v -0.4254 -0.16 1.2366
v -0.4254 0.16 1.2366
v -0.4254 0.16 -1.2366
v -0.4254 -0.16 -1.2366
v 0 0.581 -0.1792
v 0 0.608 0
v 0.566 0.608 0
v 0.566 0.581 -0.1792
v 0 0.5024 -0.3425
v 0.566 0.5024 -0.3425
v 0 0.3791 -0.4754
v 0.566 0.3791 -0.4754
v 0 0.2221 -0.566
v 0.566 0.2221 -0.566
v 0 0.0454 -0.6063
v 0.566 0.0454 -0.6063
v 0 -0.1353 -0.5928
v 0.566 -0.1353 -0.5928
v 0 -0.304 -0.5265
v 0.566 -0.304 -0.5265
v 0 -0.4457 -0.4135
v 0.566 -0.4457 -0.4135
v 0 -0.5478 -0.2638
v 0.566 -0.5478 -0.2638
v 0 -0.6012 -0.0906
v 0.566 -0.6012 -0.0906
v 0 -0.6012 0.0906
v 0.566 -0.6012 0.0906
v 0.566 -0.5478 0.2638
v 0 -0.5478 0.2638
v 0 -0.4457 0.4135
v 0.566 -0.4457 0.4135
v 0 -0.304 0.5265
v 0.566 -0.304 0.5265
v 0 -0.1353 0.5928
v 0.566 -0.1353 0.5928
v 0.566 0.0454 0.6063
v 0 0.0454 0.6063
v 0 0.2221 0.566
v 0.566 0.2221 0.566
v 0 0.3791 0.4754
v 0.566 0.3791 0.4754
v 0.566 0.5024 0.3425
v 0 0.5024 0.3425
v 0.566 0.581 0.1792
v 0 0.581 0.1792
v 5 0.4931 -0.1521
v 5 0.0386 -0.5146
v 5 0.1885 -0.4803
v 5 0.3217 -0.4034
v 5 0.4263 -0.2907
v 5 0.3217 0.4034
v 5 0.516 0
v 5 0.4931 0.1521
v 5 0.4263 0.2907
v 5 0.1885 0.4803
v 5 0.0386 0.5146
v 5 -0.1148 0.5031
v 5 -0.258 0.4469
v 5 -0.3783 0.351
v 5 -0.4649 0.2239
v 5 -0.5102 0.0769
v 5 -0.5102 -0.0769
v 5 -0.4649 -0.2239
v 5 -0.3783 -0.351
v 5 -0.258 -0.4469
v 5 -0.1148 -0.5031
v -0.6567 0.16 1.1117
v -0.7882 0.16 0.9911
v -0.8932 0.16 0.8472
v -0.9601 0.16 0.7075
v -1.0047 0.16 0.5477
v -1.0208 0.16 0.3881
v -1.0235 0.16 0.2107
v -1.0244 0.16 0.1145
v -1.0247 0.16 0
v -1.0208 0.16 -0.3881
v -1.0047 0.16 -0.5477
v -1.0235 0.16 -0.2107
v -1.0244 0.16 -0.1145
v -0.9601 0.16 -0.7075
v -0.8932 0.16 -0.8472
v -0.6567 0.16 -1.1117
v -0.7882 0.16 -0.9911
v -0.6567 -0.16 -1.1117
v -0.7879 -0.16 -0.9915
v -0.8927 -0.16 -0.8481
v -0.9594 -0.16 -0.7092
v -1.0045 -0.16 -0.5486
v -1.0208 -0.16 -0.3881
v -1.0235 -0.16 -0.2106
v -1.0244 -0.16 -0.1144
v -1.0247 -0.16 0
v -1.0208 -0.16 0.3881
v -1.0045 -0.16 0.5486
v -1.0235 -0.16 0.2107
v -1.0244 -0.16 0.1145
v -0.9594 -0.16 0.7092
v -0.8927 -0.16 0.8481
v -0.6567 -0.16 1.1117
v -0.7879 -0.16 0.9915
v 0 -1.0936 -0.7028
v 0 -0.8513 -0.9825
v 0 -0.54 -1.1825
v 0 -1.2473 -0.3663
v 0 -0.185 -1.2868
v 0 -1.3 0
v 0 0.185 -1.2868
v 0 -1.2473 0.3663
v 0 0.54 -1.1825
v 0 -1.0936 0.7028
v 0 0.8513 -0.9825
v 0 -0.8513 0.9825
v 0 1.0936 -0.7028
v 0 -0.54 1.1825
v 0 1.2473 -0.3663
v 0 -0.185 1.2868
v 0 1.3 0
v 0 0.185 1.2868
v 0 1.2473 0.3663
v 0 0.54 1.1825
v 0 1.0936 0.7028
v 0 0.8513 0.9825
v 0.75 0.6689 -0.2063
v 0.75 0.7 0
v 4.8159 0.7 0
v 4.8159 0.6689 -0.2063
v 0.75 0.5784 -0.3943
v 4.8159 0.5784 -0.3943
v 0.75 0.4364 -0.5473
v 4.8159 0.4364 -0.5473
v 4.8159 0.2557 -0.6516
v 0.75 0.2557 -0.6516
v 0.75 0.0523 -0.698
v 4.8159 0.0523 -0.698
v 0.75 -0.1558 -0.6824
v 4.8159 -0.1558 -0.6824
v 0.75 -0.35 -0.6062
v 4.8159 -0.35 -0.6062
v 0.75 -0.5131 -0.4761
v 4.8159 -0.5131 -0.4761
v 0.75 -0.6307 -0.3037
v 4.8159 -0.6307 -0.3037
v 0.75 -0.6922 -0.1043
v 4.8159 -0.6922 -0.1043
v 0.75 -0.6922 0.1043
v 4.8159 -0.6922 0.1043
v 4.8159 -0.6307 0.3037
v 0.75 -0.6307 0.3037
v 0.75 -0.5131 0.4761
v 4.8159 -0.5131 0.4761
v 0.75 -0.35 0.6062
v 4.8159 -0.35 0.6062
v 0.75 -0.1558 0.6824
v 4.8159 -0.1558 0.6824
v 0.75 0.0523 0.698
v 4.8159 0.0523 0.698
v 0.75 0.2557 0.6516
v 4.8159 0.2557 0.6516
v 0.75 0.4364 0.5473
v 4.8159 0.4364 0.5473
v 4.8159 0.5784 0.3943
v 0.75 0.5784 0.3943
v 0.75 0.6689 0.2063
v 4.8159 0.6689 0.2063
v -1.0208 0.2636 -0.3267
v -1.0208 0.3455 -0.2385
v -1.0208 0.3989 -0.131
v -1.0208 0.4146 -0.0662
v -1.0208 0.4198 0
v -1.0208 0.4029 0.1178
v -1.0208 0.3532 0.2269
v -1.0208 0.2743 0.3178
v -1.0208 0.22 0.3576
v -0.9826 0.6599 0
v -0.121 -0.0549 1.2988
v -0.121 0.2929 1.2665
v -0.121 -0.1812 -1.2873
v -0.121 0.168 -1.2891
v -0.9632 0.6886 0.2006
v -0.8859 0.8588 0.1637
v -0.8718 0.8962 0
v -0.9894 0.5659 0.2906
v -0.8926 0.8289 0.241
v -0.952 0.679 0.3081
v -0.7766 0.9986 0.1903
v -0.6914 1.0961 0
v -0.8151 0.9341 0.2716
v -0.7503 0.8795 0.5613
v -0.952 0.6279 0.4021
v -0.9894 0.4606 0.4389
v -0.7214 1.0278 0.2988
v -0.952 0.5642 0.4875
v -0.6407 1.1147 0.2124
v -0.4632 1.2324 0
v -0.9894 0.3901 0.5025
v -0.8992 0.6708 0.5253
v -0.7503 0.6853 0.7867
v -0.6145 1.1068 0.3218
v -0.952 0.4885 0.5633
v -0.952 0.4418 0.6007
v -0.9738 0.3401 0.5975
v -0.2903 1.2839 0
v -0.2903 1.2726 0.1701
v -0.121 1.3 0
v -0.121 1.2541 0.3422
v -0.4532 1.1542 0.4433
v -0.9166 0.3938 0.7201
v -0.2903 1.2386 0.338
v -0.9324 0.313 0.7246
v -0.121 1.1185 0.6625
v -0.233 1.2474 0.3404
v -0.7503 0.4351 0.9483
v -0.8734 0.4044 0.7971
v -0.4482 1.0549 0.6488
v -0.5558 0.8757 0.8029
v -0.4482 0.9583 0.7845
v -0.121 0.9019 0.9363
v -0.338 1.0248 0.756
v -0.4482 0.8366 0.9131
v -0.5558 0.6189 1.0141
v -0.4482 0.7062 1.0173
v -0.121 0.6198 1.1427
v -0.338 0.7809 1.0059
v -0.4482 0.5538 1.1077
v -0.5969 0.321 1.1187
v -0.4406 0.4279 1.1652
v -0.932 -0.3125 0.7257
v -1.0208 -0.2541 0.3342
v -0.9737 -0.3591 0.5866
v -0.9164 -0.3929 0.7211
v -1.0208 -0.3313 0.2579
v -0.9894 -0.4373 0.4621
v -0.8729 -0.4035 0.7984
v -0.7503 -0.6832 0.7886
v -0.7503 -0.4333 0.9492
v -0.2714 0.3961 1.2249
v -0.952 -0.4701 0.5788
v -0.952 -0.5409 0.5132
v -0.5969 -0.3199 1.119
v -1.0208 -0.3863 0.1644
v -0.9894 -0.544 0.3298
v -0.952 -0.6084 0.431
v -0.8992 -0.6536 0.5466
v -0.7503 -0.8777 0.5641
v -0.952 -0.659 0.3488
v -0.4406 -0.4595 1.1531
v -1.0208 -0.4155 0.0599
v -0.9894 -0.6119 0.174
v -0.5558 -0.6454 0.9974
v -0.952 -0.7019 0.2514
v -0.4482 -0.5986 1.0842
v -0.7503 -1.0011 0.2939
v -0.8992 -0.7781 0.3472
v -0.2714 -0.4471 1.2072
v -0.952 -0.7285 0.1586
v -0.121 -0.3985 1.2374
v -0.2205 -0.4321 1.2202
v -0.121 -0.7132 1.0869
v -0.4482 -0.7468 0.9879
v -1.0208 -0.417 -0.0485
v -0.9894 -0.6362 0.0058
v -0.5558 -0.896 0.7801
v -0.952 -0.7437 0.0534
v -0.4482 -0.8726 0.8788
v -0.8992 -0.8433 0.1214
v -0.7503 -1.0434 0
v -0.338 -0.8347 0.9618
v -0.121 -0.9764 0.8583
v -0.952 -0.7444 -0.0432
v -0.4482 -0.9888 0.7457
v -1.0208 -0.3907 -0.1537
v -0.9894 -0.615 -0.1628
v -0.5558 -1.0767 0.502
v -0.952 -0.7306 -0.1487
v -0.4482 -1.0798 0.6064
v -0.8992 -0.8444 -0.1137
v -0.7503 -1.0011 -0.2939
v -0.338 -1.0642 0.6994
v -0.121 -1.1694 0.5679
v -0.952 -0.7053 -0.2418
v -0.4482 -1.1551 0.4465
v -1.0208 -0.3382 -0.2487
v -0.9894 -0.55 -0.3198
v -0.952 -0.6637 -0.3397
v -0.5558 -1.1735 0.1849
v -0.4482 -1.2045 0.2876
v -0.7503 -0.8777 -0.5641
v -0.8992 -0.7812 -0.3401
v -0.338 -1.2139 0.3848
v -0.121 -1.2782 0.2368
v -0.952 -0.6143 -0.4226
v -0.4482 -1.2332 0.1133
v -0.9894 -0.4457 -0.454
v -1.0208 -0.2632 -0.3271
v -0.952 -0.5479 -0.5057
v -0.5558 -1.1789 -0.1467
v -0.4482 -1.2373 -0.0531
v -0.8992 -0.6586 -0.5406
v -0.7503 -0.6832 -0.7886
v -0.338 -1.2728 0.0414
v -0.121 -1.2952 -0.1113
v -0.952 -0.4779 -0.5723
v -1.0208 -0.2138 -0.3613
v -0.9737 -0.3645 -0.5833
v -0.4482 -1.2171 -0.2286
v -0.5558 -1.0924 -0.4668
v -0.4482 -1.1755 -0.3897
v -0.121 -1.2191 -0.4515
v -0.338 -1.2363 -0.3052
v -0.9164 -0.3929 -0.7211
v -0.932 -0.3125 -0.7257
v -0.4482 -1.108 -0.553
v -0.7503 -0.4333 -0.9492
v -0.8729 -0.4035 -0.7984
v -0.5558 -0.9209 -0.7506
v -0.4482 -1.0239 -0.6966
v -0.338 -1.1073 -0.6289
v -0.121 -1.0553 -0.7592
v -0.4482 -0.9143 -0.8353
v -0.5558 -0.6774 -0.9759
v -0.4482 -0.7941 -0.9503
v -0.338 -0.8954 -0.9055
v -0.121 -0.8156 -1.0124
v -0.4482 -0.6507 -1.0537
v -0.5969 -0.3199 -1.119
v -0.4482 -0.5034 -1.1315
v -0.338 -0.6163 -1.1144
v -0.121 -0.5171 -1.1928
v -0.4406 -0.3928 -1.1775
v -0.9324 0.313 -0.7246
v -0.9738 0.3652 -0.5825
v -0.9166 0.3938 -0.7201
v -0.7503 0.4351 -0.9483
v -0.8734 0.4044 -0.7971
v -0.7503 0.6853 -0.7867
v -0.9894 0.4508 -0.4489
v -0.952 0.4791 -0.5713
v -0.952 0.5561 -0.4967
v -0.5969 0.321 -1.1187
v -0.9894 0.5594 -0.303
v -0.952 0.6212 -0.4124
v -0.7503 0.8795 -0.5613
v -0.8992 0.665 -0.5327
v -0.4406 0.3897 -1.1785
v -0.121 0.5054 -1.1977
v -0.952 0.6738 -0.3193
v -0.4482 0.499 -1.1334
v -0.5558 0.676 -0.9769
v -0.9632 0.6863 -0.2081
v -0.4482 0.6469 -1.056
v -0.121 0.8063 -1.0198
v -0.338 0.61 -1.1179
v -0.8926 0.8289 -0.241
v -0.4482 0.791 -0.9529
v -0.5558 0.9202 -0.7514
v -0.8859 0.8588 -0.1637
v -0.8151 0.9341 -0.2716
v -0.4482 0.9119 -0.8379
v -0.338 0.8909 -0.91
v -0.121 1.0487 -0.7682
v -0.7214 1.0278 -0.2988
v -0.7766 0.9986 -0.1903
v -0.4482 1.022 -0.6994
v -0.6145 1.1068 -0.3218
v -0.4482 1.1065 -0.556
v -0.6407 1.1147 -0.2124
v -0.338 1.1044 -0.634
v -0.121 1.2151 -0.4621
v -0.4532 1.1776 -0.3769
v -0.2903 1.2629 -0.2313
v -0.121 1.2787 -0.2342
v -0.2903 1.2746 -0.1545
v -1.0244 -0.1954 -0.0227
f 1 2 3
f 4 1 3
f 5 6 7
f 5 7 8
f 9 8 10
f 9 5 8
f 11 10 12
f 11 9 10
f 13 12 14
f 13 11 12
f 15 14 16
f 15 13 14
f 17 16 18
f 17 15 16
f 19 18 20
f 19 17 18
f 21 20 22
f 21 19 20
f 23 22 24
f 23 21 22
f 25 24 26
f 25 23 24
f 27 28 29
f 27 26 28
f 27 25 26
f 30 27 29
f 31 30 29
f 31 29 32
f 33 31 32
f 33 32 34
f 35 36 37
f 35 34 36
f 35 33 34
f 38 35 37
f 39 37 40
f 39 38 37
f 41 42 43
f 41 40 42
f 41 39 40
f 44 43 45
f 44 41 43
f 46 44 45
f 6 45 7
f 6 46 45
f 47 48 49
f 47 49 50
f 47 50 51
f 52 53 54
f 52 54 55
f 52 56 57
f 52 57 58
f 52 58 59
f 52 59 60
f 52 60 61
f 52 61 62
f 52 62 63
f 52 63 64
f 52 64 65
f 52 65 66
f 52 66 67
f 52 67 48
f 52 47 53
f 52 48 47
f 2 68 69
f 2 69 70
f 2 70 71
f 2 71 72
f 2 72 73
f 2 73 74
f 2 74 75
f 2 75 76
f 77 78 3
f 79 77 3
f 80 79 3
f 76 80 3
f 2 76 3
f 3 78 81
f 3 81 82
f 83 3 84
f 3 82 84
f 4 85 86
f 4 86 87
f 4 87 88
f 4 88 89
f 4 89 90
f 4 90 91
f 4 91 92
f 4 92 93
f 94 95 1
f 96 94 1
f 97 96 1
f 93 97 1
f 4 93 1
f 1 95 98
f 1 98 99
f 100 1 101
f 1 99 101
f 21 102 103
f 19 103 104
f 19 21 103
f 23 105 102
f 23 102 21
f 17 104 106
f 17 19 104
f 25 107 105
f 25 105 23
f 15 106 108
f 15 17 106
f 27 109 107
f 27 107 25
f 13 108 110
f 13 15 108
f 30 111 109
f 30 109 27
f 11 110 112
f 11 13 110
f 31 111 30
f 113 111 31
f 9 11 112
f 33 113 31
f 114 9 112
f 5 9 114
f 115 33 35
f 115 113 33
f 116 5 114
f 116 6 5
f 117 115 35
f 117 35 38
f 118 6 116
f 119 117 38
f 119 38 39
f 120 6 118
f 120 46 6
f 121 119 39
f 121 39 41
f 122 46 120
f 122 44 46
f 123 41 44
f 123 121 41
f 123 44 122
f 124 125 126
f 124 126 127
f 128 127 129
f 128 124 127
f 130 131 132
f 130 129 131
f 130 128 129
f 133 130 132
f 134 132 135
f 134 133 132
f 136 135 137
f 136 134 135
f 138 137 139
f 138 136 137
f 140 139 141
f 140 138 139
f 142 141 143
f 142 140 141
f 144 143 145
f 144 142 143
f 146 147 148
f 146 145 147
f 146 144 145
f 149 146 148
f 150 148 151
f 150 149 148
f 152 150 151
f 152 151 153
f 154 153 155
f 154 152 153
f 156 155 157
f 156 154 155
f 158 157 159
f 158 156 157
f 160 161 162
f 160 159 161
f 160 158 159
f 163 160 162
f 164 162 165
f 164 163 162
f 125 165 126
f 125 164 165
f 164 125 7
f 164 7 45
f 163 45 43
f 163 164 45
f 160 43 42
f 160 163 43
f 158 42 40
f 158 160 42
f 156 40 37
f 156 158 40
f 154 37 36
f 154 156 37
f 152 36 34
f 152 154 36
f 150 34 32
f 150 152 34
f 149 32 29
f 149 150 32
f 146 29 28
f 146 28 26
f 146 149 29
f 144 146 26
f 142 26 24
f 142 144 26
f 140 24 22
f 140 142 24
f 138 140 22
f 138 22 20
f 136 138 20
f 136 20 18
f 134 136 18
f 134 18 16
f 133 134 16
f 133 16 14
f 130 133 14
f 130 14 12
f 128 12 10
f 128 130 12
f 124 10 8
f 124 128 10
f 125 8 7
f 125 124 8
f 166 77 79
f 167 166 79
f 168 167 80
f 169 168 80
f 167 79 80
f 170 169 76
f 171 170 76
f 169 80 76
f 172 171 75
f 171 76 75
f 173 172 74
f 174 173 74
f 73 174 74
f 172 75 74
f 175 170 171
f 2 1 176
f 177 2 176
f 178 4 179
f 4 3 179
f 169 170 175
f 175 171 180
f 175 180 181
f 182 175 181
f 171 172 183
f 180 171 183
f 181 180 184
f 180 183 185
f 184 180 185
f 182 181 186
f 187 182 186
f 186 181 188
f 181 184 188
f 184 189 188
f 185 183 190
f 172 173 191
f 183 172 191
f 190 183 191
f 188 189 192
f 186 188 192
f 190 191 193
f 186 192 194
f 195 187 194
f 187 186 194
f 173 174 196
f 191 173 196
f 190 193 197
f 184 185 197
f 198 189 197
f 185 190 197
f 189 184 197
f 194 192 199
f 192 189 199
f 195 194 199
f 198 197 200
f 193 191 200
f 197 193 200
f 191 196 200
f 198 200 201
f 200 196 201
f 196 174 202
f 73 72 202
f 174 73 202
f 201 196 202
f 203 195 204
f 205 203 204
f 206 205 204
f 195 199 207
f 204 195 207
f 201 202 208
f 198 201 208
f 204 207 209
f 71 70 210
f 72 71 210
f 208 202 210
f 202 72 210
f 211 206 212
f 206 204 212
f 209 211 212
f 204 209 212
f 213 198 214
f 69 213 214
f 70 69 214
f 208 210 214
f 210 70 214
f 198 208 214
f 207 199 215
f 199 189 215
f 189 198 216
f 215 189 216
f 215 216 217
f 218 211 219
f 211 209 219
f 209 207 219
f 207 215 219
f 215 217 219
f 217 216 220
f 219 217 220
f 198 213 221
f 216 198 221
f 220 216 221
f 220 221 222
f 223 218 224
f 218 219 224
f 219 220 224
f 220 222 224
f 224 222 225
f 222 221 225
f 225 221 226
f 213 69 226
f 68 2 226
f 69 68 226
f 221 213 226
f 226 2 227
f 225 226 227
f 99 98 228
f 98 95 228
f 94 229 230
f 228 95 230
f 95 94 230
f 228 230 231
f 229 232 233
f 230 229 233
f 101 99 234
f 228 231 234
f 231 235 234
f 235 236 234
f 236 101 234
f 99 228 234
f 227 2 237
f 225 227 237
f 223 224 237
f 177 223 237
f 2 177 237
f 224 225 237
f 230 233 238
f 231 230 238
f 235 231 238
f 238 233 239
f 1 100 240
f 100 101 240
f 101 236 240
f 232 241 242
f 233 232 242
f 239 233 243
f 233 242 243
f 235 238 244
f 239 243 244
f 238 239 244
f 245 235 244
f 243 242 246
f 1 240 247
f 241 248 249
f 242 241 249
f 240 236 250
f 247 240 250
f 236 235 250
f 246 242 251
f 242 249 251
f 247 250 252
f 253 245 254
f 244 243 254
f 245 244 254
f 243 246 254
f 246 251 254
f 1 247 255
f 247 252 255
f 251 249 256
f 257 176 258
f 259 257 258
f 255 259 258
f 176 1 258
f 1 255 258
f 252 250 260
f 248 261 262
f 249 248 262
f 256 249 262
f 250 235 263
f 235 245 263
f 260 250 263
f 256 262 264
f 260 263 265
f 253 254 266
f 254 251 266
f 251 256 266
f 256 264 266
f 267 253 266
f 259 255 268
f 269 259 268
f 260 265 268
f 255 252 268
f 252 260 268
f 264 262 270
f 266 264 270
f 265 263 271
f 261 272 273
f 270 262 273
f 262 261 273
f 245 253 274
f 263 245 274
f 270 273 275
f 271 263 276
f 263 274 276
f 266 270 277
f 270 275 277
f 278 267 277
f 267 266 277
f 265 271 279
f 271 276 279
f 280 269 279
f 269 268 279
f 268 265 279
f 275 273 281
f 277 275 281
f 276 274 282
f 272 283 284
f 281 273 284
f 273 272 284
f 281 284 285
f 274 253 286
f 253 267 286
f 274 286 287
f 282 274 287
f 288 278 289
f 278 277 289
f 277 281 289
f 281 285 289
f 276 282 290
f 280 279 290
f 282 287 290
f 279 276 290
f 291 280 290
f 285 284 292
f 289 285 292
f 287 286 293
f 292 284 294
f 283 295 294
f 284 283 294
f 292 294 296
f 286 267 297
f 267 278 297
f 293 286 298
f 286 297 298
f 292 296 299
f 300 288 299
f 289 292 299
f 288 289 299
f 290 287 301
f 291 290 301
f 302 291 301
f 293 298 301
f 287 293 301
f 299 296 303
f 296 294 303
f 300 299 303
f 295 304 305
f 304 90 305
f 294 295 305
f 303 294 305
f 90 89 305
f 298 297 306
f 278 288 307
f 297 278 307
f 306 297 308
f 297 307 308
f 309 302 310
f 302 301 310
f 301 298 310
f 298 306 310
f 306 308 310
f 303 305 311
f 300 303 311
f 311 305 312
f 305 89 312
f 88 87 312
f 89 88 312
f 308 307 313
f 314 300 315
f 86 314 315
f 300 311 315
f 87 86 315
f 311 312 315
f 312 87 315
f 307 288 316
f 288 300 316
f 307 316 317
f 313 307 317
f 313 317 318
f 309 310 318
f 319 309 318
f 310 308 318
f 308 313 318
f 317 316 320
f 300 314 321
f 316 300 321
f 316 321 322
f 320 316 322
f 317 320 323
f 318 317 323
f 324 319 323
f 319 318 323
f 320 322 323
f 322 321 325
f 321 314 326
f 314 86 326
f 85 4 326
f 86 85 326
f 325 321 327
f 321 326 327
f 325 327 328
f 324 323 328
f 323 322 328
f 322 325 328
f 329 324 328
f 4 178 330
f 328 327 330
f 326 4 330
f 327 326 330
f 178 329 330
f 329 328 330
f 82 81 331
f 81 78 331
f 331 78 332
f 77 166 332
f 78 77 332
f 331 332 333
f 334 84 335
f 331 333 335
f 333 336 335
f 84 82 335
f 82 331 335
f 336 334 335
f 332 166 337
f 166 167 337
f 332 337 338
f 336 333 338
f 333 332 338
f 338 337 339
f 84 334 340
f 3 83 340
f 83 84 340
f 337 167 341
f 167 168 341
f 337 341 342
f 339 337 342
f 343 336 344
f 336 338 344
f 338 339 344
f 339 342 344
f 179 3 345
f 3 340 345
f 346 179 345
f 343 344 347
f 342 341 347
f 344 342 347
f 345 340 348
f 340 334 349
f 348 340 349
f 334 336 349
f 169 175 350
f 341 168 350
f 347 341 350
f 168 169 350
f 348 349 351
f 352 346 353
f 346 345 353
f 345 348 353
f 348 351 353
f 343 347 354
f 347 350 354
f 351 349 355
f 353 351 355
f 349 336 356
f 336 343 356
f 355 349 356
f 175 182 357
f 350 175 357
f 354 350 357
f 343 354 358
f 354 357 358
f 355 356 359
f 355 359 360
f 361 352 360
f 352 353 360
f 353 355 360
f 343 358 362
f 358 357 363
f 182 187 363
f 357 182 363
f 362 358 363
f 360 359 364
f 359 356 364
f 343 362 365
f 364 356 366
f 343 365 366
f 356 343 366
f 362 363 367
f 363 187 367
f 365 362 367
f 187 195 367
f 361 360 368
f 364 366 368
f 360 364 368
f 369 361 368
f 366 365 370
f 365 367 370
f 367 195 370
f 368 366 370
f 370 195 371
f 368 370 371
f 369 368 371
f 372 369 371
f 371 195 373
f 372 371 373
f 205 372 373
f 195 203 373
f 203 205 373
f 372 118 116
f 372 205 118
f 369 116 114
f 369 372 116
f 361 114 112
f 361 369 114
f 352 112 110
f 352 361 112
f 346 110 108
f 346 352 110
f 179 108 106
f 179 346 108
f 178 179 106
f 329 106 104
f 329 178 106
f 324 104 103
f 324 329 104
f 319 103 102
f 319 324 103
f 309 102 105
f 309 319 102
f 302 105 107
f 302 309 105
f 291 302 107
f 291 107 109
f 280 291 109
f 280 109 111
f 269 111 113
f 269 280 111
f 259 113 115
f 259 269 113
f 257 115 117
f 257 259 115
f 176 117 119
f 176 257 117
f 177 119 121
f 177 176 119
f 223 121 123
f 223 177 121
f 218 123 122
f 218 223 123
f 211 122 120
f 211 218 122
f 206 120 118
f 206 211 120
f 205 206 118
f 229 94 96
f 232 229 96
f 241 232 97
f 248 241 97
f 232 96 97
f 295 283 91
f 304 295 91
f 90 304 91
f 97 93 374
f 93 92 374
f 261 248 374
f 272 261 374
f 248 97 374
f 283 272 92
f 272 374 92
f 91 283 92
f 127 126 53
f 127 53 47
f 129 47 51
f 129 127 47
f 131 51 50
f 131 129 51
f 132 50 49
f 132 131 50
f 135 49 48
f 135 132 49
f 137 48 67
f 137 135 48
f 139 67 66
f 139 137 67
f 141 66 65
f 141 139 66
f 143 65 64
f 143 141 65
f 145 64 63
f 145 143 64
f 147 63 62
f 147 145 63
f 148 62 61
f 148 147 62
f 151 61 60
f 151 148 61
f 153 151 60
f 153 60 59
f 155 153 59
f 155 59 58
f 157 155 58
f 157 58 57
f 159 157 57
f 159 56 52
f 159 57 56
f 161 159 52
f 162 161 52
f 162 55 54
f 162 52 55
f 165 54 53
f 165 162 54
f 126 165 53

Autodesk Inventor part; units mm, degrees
ref_plane "YZ Plane" through (0, 0, 0) normal (1, 0, 0) x (0, 1, 0)
sketch "Sketch1" plane through (0, 0, 0) normal (0, 0, 1) x (1, 0, 0)
  line L0 (-1.0254, 0) -> (5, 0)
  line L1 (5, 0) -> (5, 0.7)
  line L2 (5, 0.7) -> (0.75, 0.7)
  line L3 (0.75, 0.7) -> (0.566, 0.608)
  line L4 (0.566, 0.608) -> (0, 0.608)
  line L5 (0, 0.608) -> (0, 1.3)
  line L6 (-4.8605, 0) -> (21.908, 0) projected
  line L7 (0, -0.26) -> (0, 1.5602) projected
  line L8 (0, 1.3) -> (-0.9811, 1.2998)
  arc A0 (-0.9811, 1.2998) -> (-1.0254, 0) centre (18.0839, 0) ccw
  dimension "d0" = 5
  dimension "d1" = 4.25
  dimension "d2" = 0.184
  dimension "d3" = 1.0254
  dimension "d4" = 1.4
  dimension "d5" = 1.216
  dimension "d9" = 2.6
  dimension "d10" = 0.01
  dimension "d15" = 19.1093
revolve "Body" add sketch "Sketch1" angle 360 about axis through (-1.0254, 0, 0) along (1, 0, 0)
fillet "Fillet1" radius 0.9 1 edges at (-0.9811, -1.2998, 0)
ref_plane "IDS_WORKPLANE{1}" through (-1.0254, 0, 0) normal (1, 0, 0) x (0, 0, -1)
sketch "Sketch2" plane through (-1.0254, 0, 0) normal (1, 0, 0) x (0, 0, -1)
  line L0 (0, -1.82) -> (0, 1.82) projected
  line L1 (1.82, 0) -> (-1.82, 0) projected
  line L2 (-1.3, 0.16) -> (1.3, 0.16)
  line L3 (1.3, 0.16) -> (1.3, -0.16)
  line L4 (1.3, -0.16) -> (-1.3, -0.16)
  line L5 (-1.3, -0.16) -> (-1.3, 0.16)
  line L6 (0, 0.16) -> (0, -0.16) construction
  line L7 (-1.3, 0) -> (1.3, 0) construction
  circle A0 centre (0, 0) radius 1.3 projected
  dimension "d17" = 0.32
extrude "Slot" cut sketch "Sketch2" along normal blind 0.6 contours L4 A0 L1 L0 | L0 L1 A0 L4 | L4 L5 A0 | A0 L3 L4 | L1 A0 L2 L0 | L0 L2 A0 L1 | L5 L2 A0 | A0 L2 L3
thread "Thread" size "M1.4x0.3" class "6g" standard "ISO Metric profile" length 4.25
chamfer "Chamfer1" distance 0.184 distance2 0.1841 1 edges at (5, -0.7, 0) measured on face at (5, 0.4293, -0.1327)
ref_plane "Work Plane2" through (8.25, 0, 0) normal (0, 0, -1) x (1, 0, 0)
equation "\"d17\" = SBR"
equation "\"d18\" = STI"
equation "\"d20\" = RR"
equation "\"d11\" = GEL"
equation "\"d13\" = -0.5 * SPD + 0.5 * GD"
equation "\"d0\" = NLG"
equation "\"d1\" = GEL"
equation "\"d2\" = GAL"
equation "\"d3\" = KOH"
equation "\"d4\" = GD"
equation "\"d5\" = BDM"
equation "\"d9\" = KOD"
equation "\"d10\" = KEWI"
equation "\"GD\" = NND"
equation "\"NLG\" = 5"
equation "\"GEL\" = 4.25"
equation "\"KOD\" = 2.6"
equation "\"KOH\" = 1.02539"
equation "\"GAL\" = 0.61345 * PTC"
equation "\"SPD\" = NND - 1.2269 * PTC"
equation "\"BDM\" = 1.216"
equation "\"GUL\" = 0.61345 * PTC"
equation "\"RR\" = 0.9"
equation "\"SBR\" = 0.32"
equation "\"STI\" = 0.6"
equation "\"KEWI\" = 0.01deg"
equation "\"KR\" = 1.6"
equation "\"d16\" = -KOH"
equation "\"PTC\" = 0.3"
equation "\"THREADDIA\" = 1.4"
equation "\"TOA\" = 30deg"
equation "\"NND\" = 1.4"
equation "\"ORI\" = 0.9"
equation "\"GD1\" = THREADDIA - 1.2269 * PTC"
properties part number "CNS 9671 - M1,4 x 5" material "Steel, Mild"
